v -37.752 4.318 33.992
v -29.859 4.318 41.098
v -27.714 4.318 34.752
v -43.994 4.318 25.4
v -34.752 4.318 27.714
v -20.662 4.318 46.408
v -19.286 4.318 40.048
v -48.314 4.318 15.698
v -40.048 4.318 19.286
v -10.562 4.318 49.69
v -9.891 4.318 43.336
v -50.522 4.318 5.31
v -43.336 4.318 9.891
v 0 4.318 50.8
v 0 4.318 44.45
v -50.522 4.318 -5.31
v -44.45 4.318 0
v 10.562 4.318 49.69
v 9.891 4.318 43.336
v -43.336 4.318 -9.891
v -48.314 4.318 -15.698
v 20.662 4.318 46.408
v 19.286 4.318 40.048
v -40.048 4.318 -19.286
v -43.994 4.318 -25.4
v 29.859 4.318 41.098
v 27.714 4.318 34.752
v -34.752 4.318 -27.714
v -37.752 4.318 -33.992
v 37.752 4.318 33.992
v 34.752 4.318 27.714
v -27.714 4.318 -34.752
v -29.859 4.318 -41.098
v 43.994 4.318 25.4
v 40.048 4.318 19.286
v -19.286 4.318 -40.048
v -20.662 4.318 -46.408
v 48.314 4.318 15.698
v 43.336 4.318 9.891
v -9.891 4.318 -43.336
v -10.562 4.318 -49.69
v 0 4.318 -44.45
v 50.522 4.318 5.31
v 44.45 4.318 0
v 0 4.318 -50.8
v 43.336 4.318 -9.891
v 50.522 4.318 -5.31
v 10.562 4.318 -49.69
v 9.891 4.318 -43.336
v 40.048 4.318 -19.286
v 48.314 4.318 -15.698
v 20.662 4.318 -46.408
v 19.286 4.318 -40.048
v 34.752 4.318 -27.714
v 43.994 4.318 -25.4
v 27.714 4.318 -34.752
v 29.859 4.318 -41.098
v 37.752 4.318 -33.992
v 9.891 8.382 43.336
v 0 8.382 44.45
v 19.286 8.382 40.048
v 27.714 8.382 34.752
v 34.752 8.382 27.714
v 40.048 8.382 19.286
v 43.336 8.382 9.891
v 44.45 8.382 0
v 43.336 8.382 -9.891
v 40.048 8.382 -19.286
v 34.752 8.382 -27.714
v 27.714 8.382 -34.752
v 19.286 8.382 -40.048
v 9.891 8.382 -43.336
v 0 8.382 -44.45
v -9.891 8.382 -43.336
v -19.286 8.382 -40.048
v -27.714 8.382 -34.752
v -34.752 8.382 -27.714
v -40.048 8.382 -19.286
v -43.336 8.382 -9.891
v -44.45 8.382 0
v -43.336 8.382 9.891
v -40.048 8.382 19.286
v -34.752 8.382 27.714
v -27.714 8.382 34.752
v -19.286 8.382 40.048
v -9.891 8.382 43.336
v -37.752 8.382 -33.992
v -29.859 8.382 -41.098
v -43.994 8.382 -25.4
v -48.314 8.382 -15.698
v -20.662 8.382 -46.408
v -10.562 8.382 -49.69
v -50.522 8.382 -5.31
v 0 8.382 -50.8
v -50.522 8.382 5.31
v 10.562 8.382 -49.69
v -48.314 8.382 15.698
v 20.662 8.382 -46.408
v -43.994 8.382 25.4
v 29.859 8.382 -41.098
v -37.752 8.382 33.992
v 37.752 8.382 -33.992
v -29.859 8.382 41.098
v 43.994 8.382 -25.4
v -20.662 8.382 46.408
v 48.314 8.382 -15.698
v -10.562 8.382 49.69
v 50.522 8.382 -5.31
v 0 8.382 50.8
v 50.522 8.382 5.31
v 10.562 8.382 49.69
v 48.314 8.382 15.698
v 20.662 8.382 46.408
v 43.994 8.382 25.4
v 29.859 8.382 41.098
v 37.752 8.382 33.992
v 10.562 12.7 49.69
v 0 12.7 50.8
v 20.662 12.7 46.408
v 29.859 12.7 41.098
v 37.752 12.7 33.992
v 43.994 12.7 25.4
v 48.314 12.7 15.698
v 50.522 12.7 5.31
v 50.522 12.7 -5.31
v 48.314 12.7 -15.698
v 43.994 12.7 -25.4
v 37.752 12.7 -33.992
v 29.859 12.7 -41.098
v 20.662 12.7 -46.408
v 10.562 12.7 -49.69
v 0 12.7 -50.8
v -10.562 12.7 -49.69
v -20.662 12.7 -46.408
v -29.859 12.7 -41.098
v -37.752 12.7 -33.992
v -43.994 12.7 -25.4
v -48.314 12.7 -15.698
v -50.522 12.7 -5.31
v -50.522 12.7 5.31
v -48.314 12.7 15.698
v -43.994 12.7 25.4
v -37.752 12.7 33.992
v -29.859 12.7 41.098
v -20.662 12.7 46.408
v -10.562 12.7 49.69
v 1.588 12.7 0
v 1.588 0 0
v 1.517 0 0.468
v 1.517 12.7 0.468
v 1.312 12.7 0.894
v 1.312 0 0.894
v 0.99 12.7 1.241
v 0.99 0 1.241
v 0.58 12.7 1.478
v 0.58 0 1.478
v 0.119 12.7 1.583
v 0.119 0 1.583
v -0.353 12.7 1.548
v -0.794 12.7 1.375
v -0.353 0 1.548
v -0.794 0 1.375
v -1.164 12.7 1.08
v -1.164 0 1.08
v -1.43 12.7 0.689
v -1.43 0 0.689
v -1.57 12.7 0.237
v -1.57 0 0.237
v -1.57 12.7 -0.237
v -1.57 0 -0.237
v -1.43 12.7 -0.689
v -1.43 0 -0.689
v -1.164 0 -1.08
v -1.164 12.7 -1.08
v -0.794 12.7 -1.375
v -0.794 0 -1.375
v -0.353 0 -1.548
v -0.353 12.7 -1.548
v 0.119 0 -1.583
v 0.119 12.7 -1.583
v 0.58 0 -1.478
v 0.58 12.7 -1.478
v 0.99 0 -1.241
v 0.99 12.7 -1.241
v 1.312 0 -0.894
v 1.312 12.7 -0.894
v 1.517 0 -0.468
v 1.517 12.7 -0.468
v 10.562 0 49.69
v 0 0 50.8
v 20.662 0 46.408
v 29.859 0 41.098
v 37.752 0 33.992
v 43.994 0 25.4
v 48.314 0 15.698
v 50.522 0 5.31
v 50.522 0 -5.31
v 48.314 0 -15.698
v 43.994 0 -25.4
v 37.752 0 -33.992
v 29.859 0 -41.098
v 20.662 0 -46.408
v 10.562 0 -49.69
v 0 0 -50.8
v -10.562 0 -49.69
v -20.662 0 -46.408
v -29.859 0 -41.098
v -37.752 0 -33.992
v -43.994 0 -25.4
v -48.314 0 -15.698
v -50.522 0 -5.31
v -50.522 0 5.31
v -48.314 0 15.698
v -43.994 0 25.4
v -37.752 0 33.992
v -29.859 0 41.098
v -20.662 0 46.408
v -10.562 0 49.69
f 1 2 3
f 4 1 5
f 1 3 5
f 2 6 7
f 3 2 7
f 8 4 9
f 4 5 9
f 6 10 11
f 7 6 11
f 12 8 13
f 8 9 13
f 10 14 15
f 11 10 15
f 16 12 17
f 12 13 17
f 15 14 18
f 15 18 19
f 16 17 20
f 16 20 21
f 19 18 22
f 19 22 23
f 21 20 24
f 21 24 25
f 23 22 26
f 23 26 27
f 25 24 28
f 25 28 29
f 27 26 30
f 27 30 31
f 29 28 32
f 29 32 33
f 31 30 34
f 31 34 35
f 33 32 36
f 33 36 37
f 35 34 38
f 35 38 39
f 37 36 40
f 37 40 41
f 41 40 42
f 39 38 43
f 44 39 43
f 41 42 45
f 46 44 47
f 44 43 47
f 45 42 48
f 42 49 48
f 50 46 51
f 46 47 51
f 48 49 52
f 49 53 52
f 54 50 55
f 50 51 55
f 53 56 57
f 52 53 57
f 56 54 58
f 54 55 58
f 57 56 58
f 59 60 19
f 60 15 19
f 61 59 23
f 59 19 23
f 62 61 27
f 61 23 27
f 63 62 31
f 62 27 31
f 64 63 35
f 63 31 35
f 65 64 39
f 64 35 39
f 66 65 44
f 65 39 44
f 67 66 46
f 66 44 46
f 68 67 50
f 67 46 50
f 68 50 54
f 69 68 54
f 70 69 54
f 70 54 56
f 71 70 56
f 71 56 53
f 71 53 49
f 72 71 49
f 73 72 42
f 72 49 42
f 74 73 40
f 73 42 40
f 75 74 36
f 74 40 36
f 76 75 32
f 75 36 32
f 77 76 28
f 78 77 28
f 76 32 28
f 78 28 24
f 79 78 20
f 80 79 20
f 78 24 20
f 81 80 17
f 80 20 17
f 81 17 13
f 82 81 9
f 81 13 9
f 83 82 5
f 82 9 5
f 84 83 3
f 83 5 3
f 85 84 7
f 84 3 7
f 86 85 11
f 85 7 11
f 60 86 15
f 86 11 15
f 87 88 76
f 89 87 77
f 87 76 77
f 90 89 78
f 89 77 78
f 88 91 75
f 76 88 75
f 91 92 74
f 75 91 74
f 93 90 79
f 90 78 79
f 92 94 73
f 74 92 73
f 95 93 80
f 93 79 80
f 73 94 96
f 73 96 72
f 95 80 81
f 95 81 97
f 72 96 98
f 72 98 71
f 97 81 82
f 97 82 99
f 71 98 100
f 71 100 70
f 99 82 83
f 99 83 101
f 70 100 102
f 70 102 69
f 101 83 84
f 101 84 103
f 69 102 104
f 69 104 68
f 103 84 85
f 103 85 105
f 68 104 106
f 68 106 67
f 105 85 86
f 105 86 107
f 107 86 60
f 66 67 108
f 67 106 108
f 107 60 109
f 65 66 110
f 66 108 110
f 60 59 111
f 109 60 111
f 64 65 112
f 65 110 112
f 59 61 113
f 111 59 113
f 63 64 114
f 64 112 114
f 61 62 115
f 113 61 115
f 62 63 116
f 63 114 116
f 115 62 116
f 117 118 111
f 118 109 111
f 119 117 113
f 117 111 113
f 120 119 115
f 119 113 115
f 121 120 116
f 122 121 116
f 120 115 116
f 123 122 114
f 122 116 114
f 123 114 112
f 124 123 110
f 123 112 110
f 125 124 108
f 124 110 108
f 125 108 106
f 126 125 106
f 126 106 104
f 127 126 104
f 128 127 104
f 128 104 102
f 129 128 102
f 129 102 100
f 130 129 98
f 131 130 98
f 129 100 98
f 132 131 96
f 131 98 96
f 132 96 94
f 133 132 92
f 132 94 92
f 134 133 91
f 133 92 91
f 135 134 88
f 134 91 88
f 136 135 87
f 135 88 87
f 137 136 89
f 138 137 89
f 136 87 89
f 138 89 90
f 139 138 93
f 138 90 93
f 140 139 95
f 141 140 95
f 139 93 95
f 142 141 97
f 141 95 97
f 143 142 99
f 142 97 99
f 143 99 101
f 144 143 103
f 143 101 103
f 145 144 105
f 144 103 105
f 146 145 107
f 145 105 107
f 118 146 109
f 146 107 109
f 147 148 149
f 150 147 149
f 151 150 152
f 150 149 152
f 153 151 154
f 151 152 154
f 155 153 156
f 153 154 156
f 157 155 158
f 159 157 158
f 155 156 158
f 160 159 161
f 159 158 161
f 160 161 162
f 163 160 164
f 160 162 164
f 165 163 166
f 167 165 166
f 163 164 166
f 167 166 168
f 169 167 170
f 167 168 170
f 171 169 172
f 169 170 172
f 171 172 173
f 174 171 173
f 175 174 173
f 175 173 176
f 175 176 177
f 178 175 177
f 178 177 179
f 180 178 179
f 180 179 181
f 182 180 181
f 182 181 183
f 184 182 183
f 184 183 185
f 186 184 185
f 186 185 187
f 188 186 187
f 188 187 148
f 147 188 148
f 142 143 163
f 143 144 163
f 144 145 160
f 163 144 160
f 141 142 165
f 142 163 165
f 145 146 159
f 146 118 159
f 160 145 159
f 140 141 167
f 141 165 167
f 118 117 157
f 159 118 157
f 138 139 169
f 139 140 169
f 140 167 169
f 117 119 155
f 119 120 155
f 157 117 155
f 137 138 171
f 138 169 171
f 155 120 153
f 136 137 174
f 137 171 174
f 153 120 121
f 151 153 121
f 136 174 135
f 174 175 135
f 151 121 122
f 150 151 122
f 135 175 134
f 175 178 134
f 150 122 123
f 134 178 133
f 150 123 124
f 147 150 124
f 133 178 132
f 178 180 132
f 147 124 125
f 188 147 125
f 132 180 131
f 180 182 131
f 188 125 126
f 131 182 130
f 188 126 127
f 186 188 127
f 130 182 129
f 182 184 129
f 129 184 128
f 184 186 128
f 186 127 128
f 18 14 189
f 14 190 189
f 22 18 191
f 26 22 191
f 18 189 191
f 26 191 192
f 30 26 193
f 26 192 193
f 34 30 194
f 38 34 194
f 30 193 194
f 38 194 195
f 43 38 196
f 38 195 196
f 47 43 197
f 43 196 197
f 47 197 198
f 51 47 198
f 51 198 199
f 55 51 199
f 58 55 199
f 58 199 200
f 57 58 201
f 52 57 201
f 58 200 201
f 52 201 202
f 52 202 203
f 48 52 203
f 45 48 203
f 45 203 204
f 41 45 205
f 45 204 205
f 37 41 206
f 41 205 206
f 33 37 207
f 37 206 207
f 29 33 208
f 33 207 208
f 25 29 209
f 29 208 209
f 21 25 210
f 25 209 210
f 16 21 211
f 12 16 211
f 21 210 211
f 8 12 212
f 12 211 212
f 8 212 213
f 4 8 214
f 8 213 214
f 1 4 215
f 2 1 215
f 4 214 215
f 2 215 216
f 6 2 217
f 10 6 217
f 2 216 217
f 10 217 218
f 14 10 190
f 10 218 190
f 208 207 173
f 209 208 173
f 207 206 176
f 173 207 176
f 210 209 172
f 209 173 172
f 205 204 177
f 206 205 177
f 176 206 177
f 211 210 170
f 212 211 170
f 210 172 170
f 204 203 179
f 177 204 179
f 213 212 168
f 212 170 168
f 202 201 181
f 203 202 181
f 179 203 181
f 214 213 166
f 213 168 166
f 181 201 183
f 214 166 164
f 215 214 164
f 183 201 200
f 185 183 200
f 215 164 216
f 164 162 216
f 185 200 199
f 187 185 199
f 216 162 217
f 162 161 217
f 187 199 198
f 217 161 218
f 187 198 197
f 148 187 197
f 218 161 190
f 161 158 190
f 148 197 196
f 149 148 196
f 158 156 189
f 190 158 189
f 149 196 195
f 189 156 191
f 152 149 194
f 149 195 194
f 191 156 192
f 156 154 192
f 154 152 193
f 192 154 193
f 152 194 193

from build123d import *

# Parameters (mm, degrees)
F2_R     = 1.5875
F3_DEPTH = 12.701


with BuildPart() as f1:
    # F0 (on Right) → F1 (revolve)
    with BuildSketch(Plane.YZ):
        Polygon((0, 50.8), (0, 0), (12.7, 0), (12.7, 50.8), (8.382, 50.8), (8.382, 44.45), (4.318, 44.45), (4.318, 50.8), align=None)
    revolve(axis=Axis((0, 6.35, 0), (0, 1, 0)))

    # F2 (on face) → F3 (cut, through all)
    with BuildSketch(Plane.XZ):
        Circle(F2_R)
    extrude(amount=-F3_DEPTH, mode=Mode.SUBTRACT)


solid = f1.part
